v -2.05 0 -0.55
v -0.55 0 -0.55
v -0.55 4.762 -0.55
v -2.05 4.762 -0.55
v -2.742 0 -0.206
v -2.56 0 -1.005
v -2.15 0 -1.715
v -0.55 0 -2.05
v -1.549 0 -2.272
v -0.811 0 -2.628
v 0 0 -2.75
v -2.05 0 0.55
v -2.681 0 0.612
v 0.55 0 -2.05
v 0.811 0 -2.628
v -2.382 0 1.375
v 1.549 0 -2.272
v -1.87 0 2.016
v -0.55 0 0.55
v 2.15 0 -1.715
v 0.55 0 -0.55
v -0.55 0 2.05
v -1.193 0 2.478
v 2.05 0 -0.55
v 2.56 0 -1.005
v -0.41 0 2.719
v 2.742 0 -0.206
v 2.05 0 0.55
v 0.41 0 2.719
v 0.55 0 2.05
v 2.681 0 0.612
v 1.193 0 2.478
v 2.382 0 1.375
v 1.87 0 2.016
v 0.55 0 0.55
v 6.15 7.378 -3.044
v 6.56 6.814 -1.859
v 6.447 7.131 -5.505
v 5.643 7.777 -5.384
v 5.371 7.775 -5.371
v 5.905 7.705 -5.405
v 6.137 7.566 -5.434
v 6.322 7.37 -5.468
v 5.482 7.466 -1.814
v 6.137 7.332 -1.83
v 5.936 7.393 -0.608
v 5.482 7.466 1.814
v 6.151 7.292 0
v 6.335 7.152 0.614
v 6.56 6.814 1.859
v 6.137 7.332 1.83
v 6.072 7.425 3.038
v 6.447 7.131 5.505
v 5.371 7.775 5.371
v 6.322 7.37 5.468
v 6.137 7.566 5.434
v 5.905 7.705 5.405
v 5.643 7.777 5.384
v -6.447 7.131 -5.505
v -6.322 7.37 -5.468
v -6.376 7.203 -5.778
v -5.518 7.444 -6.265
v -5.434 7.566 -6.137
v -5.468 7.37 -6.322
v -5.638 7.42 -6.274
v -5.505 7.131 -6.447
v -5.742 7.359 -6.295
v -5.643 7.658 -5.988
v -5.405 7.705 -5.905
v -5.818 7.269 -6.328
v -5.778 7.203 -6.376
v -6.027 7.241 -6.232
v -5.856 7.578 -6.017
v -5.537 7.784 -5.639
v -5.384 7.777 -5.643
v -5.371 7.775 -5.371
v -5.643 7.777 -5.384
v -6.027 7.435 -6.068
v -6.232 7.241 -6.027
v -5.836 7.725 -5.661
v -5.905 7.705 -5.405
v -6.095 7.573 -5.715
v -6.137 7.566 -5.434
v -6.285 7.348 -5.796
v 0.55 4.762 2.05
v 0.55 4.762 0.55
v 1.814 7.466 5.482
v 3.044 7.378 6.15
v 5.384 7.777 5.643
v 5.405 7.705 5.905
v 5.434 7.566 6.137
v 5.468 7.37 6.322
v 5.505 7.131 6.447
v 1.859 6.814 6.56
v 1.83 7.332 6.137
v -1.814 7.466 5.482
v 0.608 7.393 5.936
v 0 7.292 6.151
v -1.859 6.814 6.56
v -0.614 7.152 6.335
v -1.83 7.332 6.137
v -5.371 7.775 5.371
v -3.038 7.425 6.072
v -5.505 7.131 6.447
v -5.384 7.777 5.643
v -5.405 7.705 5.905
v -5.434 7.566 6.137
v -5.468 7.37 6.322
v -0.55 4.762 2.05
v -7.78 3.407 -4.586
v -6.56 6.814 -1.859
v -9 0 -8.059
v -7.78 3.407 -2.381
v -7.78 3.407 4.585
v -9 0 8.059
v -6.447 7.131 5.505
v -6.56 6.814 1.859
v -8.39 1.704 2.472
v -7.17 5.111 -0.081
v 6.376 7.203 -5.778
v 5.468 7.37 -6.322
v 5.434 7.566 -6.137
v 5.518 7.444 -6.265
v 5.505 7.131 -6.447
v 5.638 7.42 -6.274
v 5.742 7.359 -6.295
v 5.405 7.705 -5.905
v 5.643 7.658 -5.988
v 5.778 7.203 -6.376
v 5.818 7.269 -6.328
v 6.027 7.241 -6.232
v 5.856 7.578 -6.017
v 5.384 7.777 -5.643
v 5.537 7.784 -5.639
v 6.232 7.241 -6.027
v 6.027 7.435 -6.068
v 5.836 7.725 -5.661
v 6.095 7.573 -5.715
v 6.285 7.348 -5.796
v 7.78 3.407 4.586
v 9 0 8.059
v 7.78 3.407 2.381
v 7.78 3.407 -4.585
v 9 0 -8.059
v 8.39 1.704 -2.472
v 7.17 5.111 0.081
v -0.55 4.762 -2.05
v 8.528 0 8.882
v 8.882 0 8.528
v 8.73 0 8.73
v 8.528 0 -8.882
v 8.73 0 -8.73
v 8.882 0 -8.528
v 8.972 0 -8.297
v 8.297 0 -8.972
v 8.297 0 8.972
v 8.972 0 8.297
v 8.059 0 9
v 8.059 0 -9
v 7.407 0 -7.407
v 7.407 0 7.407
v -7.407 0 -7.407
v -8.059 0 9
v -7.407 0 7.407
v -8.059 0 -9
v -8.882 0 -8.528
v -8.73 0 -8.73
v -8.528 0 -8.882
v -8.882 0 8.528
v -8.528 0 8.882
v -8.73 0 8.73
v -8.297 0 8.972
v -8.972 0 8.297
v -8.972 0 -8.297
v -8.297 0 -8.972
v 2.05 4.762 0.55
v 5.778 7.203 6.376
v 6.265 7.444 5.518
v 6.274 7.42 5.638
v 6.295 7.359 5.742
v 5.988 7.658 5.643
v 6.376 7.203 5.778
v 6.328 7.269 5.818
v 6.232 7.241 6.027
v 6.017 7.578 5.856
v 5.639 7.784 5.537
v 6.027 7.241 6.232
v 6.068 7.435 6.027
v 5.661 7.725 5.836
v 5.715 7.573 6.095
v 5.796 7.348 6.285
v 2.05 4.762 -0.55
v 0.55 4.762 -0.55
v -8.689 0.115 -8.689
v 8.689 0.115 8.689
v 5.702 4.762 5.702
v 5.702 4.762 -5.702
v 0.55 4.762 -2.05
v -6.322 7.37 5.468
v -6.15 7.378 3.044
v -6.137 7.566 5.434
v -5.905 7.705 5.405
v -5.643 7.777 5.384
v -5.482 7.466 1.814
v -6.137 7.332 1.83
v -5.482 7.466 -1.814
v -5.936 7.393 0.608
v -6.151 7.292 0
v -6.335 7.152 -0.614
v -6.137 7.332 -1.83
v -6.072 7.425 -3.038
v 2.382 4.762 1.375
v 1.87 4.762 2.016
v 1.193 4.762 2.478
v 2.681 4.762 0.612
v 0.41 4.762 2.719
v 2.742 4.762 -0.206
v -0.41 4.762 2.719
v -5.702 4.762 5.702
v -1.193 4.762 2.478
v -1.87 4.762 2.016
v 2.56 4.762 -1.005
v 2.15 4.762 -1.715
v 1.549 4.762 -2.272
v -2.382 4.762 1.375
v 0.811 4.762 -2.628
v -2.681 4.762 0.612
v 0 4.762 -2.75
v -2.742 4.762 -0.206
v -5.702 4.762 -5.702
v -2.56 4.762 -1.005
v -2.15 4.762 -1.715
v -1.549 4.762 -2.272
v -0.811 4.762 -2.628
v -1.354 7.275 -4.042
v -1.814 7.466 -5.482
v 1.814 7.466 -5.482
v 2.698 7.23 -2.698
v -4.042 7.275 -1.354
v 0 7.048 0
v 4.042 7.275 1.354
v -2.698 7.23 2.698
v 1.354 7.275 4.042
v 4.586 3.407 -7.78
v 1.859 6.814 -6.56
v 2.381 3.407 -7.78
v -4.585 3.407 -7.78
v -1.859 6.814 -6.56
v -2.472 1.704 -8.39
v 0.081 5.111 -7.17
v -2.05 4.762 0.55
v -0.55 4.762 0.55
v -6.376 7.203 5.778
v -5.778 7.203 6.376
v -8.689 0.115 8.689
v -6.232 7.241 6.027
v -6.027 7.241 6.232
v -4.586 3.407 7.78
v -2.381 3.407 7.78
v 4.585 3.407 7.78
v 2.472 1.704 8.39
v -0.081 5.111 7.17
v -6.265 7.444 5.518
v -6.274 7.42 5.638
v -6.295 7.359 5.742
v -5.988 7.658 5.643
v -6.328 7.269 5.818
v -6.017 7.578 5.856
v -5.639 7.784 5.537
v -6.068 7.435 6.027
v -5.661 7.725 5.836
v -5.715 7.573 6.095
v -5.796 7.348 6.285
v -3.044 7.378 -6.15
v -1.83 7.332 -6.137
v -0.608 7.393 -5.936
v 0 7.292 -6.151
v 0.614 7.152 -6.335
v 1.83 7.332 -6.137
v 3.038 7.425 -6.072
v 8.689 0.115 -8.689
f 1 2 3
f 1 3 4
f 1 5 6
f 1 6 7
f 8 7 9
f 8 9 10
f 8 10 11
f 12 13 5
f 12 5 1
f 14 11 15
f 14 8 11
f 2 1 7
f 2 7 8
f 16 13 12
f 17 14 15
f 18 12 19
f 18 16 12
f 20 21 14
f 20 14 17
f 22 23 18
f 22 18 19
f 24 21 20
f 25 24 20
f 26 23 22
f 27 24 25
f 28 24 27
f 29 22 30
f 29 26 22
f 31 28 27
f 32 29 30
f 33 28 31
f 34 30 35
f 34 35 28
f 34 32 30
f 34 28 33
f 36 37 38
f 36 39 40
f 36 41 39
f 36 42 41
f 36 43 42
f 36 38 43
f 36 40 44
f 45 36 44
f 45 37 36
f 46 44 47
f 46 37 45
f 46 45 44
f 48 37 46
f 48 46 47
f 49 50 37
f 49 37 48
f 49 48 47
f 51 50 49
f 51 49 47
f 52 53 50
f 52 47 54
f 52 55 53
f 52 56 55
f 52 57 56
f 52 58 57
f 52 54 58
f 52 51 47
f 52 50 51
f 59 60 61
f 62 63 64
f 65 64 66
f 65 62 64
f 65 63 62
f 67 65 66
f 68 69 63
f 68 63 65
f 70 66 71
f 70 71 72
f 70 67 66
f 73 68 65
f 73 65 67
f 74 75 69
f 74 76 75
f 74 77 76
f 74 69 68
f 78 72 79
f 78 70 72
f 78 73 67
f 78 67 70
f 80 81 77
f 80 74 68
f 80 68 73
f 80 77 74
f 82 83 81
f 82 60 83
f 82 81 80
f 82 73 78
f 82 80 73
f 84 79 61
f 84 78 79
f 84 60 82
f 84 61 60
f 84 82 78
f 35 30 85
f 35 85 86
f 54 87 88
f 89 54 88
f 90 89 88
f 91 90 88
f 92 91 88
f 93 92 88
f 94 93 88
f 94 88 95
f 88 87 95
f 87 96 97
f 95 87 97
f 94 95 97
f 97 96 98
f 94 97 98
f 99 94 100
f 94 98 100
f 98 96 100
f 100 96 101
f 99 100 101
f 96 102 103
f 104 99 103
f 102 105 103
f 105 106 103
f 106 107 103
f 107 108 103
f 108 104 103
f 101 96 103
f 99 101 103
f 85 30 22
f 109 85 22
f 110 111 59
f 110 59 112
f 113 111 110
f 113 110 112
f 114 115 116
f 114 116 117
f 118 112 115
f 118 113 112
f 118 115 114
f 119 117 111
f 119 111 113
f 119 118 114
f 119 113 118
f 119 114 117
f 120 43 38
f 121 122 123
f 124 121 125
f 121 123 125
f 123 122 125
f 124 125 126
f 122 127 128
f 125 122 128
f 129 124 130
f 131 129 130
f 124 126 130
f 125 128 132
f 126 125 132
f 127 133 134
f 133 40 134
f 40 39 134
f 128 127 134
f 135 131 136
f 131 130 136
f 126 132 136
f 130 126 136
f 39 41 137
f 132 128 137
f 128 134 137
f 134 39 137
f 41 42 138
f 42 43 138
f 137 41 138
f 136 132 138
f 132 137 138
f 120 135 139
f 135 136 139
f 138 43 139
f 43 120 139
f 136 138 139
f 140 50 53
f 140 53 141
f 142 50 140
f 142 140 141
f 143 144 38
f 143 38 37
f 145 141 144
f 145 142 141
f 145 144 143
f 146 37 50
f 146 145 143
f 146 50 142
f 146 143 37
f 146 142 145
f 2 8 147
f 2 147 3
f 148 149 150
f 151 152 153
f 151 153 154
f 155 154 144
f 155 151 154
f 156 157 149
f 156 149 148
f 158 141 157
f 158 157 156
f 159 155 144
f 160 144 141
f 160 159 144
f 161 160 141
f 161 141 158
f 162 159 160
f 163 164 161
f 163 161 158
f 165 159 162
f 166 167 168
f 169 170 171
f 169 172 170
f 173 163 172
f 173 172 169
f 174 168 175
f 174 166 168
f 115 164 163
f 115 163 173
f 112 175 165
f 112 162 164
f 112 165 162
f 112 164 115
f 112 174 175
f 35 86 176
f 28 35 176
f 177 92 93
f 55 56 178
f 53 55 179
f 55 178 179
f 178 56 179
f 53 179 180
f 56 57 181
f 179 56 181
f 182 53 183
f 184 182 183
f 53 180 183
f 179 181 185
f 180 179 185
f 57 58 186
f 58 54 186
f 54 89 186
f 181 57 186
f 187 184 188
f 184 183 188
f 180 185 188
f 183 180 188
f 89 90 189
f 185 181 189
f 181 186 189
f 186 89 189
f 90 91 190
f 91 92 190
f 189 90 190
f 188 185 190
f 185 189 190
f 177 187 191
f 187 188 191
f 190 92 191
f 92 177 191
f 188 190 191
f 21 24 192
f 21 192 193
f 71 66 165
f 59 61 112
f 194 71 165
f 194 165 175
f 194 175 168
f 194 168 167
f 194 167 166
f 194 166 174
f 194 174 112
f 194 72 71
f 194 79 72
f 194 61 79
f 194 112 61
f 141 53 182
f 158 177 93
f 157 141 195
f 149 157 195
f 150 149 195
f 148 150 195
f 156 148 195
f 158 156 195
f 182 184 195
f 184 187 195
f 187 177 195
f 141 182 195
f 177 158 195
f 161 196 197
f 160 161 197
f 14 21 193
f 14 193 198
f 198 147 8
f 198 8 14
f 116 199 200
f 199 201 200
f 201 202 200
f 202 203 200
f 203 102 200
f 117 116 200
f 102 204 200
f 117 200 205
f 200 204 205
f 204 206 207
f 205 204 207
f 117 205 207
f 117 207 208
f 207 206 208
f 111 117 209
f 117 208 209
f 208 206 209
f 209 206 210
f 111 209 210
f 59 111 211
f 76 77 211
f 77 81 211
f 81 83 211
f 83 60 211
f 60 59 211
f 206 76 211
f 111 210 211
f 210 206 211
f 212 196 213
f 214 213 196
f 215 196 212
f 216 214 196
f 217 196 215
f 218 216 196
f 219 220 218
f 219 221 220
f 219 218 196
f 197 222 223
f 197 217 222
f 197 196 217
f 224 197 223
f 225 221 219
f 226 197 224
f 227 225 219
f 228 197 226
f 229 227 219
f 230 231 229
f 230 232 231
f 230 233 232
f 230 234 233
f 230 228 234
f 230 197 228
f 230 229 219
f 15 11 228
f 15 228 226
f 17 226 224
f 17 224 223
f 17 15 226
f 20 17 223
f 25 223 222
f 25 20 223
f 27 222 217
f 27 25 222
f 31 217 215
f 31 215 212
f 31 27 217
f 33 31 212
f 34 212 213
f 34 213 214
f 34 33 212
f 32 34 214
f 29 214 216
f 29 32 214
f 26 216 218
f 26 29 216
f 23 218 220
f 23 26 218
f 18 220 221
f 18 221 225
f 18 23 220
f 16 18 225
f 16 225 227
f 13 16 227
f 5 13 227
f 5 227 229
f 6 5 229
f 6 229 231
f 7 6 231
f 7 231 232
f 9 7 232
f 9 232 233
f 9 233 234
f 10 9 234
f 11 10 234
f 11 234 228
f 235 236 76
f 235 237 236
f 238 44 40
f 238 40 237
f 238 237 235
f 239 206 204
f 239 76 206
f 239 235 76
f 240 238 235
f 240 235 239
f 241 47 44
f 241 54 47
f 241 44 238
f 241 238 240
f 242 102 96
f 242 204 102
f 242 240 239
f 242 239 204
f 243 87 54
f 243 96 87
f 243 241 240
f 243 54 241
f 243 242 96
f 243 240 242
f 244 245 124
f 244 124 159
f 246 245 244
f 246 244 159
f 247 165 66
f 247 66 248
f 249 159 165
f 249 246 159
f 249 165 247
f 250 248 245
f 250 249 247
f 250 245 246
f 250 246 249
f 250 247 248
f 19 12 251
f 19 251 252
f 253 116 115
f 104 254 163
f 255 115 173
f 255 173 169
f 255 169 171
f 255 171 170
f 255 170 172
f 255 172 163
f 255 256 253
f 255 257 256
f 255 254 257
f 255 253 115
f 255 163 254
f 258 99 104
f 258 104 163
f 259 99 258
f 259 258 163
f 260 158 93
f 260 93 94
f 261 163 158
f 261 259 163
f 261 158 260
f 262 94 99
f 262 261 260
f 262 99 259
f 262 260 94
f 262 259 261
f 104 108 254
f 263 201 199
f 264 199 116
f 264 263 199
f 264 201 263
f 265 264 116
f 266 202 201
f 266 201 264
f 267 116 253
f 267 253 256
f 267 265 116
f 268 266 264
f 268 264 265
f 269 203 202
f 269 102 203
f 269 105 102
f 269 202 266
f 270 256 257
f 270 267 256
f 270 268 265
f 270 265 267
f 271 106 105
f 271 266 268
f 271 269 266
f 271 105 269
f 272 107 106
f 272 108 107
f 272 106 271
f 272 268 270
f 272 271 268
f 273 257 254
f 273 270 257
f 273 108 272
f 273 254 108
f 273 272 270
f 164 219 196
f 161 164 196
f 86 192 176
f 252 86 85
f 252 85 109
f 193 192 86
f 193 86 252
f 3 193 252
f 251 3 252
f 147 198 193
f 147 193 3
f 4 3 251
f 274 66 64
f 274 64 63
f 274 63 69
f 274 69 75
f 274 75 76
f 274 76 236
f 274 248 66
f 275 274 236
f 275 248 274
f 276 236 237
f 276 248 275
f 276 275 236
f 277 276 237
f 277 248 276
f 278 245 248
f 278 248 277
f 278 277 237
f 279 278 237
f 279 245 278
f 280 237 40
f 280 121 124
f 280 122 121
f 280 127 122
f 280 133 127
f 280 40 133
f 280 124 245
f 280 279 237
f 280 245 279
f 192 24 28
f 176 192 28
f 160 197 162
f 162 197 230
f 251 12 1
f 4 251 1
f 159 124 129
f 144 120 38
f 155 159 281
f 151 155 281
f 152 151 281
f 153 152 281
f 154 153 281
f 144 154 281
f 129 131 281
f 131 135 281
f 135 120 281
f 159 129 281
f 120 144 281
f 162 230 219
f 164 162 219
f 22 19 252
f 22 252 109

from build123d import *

# Parameters (mm, degrees)
BOSS_EXTRUDE1_DEPTH      = 8
BOSS_EXTRUDE1_TAPER      = 19.700000000000042
FILLET1_R                = 1
SHELL1_T                 = -1.5
BOSS_EXTRUDE2_REACH      = 16.924
BOSS_EXTRUDE2_END_RADIUS = 41.49999999999999
SKETCH4_R                = 2.75
SKETCH4_R_2              = 2
CUT_EXTRUDE2_REACH       = 16.924
CUT_EXTRUDE2_END_RADIUS  = 41.49999999999999
BOSS_EXTRUDE3_START      = -1.43836
SKETCH8_W                = 12.593266454489342
SKETCH8_H                = 12.593266454489337
BOSS_EXTRUDE3_DEPTH      = 1.43836


with BuildPart() as part:
    # Sketch1 → Boss-Extrude1 (new body)
    with BuildSketch(Plane(origin=(0, 0, 0), x_dir=(1, 0, 0), z_dir=(0, 1, 0))):
        Polygon((8.999999999999996, 9.000000000000002), (-9.000000000000004, 8.999999999999998), (-9, -9.000000000000002), (9, -9), align=None)
    extrude(amount=BOSS_EXTRUDE1_DEPTH, taper=BOSS_EXTRUDE1_TAPER)

    # Sketch3 → Cut-Revolve2 (revolve, cut)
    with BuildSketch(Plane(origin=(0, 0, 0), x_dir=(-0.7071067811865476, 0, -0.7071067811865476), z_dir=(0.7071067811865476, 0, -0.7071067811865476))):
        with BuildLine():
            Line((-40, 47.04752471069329), (40, 47.04752471069329))
            ThreePointArc((40, 47.04752471069329), (-7.35e-15, 7.047524710693288), (-40, 47.04752471069329))
        make_face()
    revolve(axis=Axis((28.2842712474619, 47.04752471069329, 28.2842712474619), (-0.7071067811865476, 0, -0.7071067811865476)), mode=Mode.SUBTRACT)

    # Fillet1
    fillet1_edges = [part.edges().sort_by_distance(p)[0] for p in [
        (-3.7925e-13, 7.546443435071887, 6.297982062276191),
        (6.297982062276188, 7.546443435071887, 3.606e-13),
        (-6.297982062276191, 7.5464434350718905, -3.5616e-13),
        (3.7481e-13, 7.546443435071887, -6.297982062276189),
        (7.567792650420588, 4, 7.567792650420591),
        (7.5677926504205875, 4, -7.567792650420591),
        (-7.567792650420594, 4, -7.567792650420589),
        (-7.567792650420591, 4, 7.567792650420593),
    ]]
    fillet(fillet1_edges, radius=FILLET1_R)

    # Shell1
    shell1_openings = [part.faces().sort_by_distance(p)[0] for p in [
        (0, 0, 0),
    ]]
    offset(amount=SHELL1_T, openings=shell1_openings)

    # Boss-Extrude2: up to this sphere (the profile starts outside it)
    boss_extrude2_end = Location((0, 47.04752471069329, 0)) * Sphere(BOSS_EXTRUDE2_END_RADIUS, mode=Mode.PRIVATE)
    # Sketch4 → Boss-Extrude2 (add, up to the surface)
    with BuildSketch(Plane.XZ, mode=Mode.PRIVATE) as boss_extrude2_sk1:
        with Locations(Location((0, 0, 0), (0, 0, 270))):
            Circle(SKETCH4_R)
        Circle(SKETCH4_R_2, mode=Mode.SUBTRACT)
    boss_extrude2_tool1 = extrude(boss_extrude2_sk1.sketch, amount=-BOSS_EXTRUDE2_REACH, mode=Mode.PRIVATE) - boss_extrude2_end
    add(boss_extrude2_tool1.solids().sort_by_distance((0, 0, 2.672218))[0])
    # Sketch4 → Boss-Extrude2 (add, up to the surface)
    with BuildSketch(Plane.XZ, mode=Mode.PRIVATE) as boss_extrude2_sk2:
        Circle(SKETCH4_R_2)
    boss_extrude2_tool2 = extrude(boss_extrude2_sk2.sketch, amount=-BOSS_EXTRUDE2_REACH, mode=Mode.PRIVATE) - boss_extrude2_end
    add(boss_extrude2_tool2.solids().sort_by_distance((0, 0, 0))[0])

    # Cut-Extrude2: up to this sphere (the profile starts outside it)
    cut_extrude2_end = Location((0, 47.04752471069329, 0)) * Sphere(CUT_EXTRUDE2_END_RADIUS, mode=Mode.PRIVATE)
    # Sketch6 → Cut-Extrude2 (cut, up to the surface)
    with BuildSketch(Plane.XZ, mode=Mode.PRIVATE) as cut_extrude2_sk1:
        Polygon((-1.1e-16, -2.05), (-0.5500000000000002, -2.05), (-0.5500000000000002, -0.5500000000000002), (-2.05, -0.5500000000000005), (-2.05, -4.3e-16), (-2.05, 0.5499999999999996), (-0.5500000000000002, 0.5499999999999997), (-0.5500000000000002, 2.0499999999999994), (-1.1e-16, 2.0499999999999994), (0.5500000000000002, 2.0499999999999994), (0.5500000000000002, 0.5499999999999997), (2.05, 0.55), (2.0499999999999994, -2.1e-16), (2.05, -0.55), (0.55, -0.55), (0.5499999999999999, -2.0499999999999994), align=None)
    cut_extrude2_tool1 = extrude(cut_extrude2_sk1.sketch, amount=-CUT_EXTRUDE2_REACH, mode=Mode.PRIVATE) - cut_extrude2_end
    add(cut_extrude2_tool1.solids().sort_by_distance((0, 0, 0))[0], mode=Mode.SUBTRACT)

    # Sketch8 → Boss-Extrude3 (add)
    with BuildSketch(Plane(origin=(0, 4.7625, 0), x_dir=(-1, 0, 0), z_dir=(0, -1, 0)).offset(BOSS_EXTRUDE3_START)):
        Rectangle(SKETCH8_W, SKETCH8_H)
    extrude(amount=BOSS_EXTRUDE3_DEPTH)


solid = part.part
